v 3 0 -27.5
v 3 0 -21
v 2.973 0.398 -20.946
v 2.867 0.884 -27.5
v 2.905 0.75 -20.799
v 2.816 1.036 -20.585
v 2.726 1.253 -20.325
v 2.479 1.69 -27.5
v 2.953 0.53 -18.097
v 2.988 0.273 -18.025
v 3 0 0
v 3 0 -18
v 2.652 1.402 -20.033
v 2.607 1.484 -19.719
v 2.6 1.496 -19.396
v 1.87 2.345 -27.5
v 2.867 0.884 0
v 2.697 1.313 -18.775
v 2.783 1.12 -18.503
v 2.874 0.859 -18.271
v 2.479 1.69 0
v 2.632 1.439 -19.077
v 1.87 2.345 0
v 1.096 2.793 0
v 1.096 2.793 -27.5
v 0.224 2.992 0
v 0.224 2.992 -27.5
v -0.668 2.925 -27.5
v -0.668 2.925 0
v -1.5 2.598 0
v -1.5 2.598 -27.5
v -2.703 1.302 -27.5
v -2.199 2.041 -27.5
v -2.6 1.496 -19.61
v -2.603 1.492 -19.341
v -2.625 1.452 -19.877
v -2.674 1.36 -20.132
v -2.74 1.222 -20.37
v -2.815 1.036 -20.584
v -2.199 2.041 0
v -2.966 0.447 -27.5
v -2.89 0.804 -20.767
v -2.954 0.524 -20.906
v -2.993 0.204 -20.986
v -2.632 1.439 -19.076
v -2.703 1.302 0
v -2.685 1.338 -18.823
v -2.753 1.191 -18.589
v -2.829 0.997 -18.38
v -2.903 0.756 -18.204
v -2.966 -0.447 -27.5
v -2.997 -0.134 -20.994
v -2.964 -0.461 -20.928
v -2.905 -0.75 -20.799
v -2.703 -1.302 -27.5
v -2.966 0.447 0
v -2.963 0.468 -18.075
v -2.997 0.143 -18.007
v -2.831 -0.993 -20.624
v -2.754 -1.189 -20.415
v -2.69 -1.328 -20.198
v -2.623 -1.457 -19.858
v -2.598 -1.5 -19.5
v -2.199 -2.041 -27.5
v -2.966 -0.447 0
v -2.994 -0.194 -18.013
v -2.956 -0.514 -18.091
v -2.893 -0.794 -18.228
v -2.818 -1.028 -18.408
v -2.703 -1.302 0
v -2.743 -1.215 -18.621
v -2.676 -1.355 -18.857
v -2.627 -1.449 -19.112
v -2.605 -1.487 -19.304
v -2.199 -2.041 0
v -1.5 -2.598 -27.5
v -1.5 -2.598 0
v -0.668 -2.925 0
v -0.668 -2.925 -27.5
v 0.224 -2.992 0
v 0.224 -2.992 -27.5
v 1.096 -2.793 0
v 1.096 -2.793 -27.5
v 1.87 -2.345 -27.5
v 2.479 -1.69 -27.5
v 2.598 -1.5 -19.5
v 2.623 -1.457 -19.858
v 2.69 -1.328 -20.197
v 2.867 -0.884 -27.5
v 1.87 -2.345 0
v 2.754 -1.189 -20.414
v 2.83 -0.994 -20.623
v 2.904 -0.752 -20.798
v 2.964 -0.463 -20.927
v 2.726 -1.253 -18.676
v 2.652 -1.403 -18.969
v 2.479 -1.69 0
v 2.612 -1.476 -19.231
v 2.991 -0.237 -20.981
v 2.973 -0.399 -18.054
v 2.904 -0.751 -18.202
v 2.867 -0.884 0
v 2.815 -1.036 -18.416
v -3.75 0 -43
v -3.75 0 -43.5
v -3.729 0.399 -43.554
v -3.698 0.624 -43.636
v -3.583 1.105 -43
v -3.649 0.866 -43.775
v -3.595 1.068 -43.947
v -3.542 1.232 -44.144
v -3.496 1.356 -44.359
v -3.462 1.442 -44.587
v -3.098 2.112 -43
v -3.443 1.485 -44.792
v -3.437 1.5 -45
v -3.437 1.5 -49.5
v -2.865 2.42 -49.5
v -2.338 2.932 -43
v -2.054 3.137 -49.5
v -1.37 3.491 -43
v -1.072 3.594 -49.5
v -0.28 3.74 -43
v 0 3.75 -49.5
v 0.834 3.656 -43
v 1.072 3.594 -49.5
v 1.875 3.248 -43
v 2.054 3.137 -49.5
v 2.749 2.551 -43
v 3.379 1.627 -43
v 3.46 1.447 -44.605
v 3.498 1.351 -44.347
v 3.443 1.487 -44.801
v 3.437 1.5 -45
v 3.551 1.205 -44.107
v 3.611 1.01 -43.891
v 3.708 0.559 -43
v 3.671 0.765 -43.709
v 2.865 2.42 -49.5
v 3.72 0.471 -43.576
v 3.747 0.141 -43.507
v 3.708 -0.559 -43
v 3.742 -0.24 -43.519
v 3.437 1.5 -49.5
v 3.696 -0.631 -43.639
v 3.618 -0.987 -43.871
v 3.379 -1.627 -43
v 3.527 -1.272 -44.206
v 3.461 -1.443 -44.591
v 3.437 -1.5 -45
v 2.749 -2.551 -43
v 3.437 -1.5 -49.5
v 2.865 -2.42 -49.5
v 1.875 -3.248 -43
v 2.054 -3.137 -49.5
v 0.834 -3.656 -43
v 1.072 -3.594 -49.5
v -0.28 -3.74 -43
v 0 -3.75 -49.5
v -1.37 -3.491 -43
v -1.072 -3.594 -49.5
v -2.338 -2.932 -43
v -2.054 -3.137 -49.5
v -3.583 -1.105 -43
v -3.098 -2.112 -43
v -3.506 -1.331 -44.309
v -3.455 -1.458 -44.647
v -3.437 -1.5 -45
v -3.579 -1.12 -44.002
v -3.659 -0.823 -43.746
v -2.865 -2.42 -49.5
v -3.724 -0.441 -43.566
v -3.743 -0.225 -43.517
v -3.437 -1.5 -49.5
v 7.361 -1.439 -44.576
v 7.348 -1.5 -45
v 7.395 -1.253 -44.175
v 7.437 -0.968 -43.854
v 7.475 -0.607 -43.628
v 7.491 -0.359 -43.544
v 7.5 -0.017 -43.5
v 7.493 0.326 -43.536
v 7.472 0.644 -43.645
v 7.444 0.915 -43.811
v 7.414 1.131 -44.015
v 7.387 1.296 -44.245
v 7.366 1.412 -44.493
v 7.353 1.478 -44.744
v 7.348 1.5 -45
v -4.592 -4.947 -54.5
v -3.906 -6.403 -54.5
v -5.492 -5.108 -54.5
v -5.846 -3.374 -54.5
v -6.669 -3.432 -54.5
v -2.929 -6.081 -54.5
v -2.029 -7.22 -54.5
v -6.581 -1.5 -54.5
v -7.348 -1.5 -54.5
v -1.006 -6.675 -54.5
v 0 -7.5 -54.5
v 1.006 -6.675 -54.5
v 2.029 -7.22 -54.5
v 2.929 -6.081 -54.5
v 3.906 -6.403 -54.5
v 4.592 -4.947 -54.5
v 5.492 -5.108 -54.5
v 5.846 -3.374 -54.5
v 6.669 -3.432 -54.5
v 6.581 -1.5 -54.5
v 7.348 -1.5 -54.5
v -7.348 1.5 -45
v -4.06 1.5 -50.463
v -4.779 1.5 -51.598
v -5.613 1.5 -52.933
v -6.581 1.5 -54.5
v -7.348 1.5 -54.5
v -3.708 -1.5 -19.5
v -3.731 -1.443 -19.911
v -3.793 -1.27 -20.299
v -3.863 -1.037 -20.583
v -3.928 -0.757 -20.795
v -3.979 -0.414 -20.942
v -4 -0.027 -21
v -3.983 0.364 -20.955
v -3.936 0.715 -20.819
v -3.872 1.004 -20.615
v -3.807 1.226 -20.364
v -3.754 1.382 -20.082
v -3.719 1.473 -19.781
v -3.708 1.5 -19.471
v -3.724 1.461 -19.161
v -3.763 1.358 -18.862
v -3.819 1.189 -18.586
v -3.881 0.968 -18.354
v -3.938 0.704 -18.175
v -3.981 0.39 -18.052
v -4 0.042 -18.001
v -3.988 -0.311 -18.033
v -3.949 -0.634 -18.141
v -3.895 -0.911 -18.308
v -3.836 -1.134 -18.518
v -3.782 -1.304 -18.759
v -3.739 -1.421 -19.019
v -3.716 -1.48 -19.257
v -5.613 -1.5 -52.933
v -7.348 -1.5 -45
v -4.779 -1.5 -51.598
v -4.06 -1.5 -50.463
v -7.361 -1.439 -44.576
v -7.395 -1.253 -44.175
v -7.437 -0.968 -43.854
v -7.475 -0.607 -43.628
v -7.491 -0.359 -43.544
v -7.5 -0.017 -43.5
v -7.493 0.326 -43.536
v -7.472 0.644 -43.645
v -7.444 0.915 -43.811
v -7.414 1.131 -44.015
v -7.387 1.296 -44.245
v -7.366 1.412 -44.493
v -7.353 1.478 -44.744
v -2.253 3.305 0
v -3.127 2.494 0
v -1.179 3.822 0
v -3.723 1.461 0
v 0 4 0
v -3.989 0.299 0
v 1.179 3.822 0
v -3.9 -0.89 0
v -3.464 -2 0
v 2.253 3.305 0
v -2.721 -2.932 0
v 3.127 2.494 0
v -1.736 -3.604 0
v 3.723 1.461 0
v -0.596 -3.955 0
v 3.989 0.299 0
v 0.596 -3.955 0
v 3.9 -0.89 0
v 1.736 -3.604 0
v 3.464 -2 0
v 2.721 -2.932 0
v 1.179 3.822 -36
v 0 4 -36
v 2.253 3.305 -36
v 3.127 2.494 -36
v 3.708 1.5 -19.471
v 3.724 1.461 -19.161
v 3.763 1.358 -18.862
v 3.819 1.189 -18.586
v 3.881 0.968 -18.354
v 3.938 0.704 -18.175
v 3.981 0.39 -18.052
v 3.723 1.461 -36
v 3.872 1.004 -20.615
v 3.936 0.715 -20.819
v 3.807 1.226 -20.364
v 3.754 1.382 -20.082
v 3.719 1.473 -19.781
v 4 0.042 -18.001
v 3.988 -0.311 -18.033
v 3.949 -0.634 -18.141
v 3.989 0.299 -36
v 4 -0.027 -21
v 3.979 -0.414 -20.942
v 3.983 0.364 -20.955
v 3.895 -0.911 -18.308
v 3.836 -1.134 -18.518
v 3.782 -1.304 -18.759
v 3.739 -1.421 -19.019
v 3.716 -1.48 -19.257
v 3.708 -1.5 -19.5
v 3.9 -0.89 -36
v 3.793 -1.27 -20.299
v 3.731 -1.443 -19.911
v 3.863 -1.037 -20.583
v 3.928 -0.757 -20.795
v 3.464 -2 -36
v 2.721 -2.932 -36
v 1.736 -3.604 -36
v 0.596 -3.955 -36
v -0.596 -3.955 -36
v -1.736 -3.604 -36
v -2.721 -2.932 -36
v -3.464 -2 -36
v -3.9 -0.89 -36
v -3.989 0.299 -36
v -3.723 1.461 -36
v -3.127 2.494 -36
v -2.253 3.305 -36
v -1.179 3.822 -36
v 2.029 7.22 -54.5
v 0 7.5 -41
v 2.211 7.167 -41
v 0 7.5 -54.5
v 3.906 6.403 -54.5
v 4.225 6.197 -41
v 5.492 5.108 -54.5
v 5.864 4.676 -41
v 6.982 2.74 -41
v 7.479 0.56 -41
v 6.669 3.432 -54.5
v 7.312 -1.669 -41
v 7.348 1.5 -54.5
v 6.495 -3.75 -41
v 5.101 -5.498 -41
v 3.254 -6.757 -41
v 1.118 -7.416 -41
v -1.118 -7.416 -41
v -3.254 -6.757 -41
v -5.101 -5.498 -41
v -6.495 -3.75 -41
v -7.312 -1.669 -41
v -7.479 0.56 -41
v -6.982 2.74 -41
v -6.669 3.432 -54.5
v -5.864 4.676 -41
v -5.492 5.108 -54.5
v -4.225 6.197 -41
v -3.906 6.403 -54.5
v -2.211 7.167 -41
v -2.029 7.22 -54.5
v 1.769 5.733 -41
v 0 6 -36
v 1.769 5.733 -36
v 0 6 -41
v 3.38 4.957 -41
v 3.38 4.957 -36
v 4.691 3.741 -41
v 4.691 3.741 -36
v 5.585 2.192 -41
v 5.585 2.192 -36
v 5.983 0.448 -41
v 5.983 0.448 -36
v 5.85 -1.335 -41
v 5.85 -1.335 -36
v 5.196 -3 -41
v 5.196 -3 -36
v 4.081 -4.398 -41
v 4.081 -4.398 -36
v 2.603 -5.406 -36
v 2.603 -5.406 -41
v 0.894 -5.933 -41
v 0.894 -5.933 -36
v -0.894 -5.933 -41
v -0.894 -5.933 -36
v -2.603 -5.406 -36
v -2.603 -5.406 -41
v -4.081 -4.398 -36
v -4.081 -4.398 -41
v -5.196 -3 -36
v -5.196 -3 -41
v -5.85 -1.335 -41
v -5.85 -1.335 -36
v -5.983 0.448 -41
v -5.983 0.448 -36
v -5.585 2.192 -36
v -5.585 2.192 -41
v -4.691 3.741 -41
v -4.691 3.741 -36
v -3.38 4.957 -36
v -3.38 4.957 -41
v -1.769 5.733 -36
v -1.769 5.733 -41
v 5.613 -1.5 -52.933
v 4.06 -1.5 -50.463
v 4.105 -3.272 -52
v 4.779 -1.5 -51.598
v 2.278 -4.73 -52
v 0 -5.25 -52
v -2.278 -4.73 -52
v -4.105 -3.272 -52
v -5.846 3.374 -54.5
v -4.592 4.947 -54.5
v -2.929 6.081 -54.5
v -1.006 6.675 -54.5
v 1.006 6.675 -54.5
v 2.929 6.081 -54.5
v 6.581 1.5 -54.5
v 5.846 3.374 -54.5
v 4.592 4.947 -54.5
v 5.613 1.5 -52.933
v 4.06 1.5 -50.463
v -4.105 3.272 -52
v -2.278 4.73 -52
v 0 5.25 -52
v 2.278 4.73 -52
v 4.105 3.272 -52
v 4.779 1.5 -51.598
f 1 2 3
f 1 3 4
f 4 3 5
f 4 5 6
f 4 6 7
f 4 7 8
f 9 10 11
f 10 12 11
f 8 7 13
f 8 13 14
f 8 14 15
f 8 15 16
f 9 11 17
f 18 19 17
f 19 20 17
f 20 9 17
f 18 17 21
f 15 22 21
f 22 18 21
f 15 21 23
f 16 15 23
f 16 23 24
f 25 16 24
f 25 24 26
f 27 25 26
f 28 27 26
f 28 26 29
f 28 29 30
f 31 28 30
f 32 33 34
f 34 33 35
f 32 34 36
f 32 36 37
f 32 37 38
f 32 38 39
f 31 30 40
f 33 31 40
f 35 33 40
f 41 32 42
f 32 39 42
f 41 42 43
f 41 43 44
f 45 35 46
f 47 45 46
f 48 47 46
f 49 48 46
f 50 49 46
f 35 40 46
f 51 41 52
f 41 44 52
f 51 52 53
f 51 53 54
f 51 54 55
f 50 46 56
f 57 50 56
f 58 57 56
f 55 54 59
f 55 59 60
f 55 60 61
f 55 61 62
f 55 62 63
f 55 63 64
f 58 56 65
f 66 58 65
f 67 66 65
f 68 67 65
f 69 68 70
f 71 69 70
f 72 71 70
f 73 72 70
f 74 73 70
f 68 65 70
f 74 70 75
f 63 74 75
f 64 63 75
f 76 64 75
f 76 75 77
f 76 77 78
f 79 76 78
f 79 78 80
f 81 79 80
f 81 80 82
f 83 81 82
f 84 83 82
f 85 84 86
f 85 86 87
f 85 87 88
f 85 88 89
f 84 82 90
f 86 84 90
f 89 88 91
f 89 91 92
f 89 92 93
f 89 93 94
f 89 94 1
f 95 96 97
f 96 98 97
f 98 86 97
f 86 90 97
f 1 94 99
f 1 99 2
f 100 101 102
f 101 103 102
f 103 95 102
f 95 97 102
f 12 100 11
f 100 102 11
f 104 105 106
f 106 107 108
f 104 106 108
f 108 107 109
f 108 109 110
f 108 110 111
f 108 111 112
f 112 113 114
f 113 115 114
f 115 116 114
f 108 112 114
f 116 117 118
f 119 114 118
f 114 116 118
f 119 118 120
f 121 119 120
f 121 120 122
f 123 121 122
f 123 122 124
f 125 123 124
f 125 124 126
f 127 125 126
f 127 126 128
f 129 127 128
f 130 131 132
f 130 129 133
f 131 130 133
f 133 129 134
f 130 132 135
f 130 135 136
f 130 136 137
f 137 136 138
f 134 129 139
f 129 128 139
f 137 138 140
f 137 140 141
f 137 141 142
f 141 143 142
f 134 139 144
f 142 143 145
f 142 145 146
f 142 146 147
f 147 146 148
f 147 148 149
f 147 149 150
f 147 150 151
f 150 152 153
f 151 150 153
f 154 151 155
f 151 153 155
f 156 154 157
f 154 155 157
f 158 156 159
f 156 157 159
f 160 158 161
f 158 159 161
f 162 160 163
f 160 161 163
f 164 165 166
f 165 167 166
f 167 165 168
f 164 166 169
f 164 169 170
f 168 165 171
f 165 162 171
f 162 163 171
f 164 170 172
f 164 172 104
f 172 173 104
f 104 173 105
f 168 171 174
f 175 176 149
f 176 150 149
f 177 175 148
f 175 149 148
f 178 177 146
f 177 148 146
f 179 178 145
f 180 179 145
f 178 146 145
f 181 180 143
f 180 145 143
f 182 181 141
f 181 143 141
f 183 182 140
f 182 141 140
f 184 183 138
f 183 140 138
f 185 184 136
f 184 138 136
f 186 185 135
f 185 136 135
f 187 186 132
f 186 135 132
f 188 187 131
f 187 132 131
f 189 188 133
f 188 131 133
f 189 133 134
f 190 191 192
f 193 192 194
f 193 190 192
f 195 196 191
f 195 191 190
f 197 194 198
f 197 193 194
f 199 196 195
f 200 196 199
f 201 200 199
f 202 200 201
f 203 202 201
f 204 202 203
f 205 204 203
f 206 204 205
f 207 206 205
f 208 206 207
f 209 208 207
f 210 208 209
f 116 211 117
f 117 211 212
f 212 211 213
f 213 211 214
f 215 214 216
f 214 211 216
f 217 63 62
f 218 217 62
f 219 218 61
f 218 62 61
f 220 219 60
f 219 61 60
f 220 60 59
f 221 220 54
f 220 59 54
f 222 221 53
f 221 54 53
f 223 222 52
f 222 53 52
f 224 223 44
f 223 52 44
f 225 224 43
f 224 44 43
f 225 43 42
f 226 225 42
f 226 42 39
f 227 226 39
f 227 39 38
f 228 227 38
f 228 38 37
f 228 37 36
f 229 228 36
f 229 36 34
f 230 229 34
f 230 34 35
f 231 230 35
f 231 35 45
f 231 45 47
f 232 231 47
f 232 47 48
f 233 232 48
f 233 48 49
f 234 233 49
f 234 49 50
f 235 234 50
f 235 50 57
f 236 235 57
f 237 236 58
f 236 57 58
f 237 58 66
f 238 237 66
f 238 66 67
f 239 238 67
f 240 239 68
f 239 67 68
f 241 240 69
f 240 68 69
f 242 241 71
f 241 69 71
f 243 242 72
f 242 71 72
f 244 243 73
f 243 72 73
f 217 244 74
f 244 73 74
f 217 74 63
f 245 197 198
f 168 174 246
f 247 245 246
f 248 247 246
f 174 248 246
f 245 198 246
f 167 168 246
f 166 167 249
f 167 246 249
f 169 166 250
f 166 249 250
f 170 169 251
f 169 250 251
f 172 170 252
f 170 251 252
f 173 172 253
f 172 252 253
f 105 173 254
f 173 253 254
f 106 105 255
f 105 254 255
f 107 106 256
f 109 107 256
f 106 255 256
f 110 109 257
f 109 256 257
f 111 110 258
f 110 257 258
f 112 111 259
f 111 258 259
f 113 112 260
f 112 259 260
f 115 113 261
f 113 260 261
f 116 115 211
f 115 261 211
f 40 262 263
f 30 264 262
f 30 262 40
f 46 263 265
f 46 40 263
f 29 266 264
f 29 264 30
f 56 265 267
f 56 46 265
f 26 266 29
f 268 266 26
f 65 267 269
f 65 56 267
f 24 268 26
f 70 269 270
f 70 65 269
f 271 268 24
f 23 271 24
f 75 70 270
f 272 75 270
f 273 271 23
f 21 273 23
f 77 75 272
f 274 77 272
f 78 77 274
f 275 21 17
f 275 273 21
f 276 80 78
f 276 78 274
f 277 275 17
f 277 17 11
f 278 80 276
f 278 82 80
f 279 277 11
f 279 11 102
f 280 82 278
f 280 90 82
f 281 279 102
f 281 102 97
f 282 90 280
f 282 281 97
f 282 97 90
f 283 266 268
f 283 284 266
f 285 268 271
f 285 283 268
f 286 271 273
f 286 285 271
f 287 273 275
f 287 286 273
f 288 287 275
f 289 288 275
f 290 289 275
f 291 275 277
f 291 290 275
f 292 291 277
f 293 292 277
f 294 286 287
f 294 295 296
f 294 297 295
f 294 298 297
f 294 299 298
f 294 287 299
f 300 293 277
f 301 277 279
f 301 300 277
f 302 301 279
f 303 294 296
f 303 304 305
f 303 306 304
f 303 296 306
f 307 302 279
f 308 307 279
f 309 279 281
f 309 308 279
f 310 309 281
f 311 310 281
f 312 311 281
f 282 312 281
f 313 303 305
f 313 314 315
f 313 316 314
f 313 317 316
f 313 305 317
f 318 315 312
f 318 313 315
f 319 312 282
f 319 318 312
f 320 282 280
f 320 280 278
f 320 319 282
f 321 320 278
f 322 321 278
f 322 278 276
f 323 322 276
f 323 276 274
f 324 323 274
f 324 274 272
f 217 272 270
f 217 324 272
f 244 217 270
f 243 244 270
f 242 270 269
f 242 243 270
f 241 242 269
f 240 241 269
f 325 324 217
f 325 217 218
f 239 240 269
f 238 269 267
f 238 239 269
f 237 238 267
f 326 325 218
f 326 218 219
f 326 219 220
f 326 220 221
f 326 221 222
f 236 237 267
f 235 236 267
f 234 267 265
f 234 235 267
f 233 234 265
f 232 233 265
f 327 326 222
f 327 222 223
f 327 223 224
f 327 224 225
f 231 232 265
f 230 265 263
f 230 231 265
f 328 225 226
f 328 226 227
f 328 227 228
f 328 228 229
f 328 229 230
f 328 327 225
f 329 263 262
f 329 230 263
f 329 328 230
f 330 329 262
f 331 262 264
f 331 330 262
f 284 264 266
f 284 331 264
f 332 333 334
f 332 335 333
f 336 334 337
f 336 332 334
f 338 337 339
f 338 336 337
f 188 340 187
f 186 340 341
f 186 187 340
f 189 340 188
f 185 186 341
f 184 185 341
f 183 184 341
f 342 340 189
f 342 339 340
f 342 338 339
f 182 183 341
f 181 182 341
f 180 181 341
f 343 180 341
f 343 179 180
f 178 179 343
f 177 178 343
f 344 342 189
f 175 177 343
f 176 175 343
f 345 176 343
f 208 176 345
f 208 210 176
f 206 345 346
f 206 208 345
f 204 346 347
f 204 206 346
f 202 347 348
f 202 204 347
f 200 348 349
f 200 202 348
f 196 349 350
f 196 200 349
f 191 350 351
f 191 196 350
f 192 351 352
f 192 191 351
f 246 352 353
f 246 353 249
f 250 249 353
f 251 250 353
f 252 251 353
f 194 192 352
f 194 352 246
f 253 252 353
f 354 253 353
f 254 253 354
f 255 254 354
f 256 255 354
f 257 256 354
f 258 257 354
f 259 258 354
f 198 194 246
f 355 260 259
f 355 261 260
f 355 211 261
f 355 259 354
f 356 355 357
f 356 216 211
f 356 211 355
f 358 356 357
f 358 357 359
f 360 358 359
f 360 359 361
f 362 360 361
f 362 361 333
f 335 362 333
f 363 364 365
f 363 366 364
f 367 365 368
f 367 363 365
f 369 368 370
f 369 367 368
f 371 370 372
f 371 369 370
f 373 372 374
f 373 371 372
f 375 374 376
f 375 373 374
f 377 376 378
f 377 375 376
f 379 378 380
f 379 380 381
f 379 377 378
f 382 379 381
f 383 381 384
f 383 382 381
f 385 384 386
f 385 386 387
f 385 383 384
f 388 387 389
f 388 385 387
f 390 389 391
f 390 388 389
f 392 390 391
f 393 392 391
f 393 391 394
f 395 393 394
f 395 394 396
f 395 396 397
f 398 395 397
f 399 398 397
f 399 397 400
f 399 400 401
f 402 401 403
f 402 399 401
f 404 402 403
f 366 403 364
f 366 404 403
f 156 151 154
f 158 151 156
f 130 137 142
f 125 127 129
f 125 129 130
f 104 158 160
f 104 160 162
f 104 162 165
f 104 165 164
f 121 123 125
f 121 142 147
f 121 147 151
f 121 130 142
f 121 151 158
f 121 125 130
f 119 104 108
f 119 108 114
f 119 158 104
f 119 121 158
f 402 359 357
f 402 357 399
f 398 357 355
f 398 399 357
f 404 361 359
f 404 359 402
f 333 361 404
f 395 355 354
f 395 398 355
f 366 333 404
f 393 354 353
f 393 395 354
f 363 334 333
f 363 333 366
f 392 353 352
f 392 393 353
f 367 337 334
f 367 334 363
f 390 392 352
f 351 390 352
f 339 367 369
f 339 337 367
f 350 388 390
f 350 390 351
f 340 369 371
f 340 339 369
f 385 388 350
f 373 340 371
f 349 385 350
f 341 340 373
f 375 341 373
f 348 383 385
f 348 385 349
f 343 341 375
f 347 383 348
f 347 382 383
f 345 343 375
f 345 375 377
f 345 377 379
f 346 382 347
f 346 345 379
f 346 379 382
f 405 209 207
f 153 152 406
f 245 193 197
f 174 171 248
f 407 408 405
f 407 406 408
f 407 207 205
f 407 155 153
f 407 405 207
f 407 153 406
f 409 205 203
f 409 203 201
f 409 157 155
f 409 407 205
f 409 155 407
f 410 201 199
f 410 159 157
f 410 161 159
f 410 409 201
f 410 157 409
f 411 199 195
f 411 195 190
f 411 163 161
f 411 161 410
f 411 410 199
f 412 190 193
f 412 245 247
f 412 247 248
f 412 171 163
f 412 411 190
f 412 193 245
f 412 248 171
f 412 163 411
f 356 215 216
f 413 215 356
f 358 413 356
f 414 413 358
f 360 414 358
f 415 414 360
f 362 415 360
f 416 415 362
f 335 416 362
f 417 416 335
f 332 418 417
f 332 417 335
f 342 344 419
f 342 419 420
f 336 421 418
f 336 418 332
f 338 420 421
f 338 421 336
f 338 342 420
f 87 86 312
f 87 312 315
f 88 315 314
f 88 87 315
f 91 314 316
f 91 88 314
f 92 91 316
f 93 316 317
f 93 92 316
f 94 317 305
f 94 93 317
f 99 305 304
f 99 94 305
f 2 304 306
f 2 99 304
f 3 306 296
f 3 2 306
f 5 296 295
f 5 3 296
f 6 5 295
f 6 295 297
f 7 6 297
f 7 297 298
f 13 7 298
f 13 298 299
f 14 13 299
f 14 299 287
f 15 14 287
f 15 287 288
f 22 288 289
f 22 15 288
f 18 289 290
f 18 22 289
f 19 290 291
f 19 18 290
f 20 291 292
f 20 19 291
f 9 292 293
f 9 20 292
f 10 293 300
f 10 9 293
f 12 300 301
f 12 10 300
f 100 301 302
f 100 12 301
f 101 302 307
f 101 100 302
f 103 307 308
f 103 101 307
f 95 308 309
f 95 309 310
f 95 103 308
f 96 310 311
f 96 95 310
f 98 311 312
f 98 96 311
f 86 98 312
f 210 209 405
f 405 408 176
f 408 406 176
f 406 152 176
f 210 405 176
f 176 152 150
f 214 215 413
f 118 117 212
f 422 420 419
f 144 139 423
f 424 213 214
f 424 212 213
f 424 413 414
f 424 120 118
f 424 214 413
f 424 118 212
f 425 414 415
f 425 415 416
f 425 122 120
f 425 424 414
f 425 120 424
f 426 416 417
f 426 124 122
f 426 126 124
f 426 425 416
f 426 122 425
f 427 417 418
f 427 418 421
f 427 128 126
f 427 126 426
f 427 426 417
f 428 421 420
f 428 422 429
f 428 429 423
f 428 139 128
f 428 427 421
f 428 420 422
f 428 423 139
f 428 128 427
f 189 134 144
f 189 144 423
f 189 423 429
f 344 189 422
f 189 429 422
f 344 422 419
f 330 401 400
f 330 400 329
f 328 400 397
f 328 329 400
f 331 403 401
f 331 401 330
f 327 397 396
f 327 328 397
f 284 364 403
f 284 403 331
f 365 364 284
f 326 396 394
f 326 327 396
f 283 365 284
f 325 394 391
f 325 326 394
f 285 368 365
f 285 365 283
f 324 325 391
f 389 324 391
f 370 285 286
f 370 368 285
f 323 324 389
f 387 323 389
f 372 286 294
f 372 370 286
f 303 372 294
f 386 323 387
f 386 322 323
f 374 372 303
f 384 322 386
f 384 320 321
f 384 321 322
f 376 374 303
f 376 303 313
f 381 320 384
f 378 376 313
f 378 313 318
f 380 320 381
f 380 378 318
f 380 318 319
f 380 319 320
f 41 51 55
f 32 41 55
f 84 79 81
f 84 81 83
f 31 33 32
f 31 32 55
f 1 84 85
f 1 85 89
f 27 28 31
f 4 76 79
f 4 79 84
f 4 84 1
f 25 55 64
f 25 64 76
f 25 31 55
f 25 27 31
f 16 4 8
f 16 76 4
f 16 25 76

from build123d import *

# Parameters (mm, degrees)
CUT_EXTRUDE1_DEPTH      = 8.5
CUT_EXTRUDE1_DEPTH_BACK = 8.5
SKETCH3_R               = 3.75
CUT_EXTRUDE2_DEPTH      = 11.5
CHAMFER1_SIZE           = 3
CHAMFER1_SIZE2          = 5
CHAMFER1_PART_2_SIZE    = 3
CHAMFER1_PART_2_SIZE2   = 5
SKETCH4_R               = 3
CUT_EXTRUDE3_DEPTH      = 27.5
SKETCH5_R               = 1.5
CUT_EXTRUDE4_DEPTH      = 8.5000001
CUT_EXTRUDE4_DEPTH_BACK = 8.5000001


with BuildPart() as part:
    # Sketch1 → Revolve1 (revolve)
    with BuildSketch(Plane(origin=(0, 0, 0), x_dir=(0, 0, -1), z_dir=(1, 0, 0))):
        Polygon((0, 4), (36, 4), (36, 6), (41, 6), (41, 7.5), (54.5, 7.5), (54.5, 0), (0, 0), align=None)
    revolve(axis=Axis((0, 0, 0), (0, 0, -1)))

    # Sketch2 → Cut-Extrude1 (cut, two sides)
    with BuildSketch(Plane(origin=(0, 0, 0), x_dir=(0, 0, -1), z_dir=(1, 0, 0))) as cut_extrude1_sk:
        with BuildLine():
            Line((54.5, -1.5), (45, -1.5))
            ThreePointArc((45, -1.5), (43.5, 0), (45, 1.5))
            Line((45, 1.5), (54.5, 1.5))
            ThreePointArc((54.5, 1.5), (56, 0), (54.5, -1.5))
        make_face()
    extrude(amount=CUT_EXTRUDE1_DEPTH, mode=Mode.SUBTRACT)
    extrude(cut_extrude1_sk.sketch, amount=-CUT_EXTRUDE1_DEPTH_BACK, mode=Mode.SUBTRACT)

    # Sketch3 → Cut-Extrude2 (cut)
    with BuildSketch(Plane(origin=(0, 0, -54.5), x_dir=(-1, 0, 0), z_dir=(0, 0, -1))):
        Circle(SKETCH3_R)
    extrude(amount=-CUT_EXTRUDE2_DEPTH, mode=Mode.SUBTRACT)

    # Chamfer1
    chamfer1_edges = [part.edges().sort_by_distance(p)[0] for p in [
        (0, -3.75, -54.5),
    ]]
    chamfer1_side = [part.faces().sort_by_distance(p)[0] for p in [
        (0, -4.328722243, -54.5),
    ]]
    chamfer(chamfer1_edges, length=CHAMFER1_SIZE, length2=CHAMFER1_SIZE2, reference=chamfer1_side[0])

    # Chamfer1 part 2
    chamfer1_part_2_edges = [part.edges().sort_by_distance(p)[0] for p in [
        (0, 3.75, -54.5),
    ]]
    chamfer1_part_2_side = [part.faces().sort_by_distance(p)[0] for p in [
        (0, 4.328722243, -54.5),
    ]]
    chamfer(chamfer1_part_2_edges, length=CHAMFER1_PART_2_SIZE, length2=CHAMFER1_PART_2_SIZE2, reference=chamfer1_part_2_side[0])

    # Sketch4 → Cut-Extrude3 (cut)
    with BuildSketch(Plane.XY):
        Circle(SKETCH4_R)
    extrude(amount=-CUT_EXTRUDE3_DEPTH, mode=Mode.SUBTRACT)

    # Sketch5 → Cut-Extrude4 (cut, two sides)
    with BuildSketch(Plane(origin=(0, 0, 0), x_dir=(0, -1, 0), z_dir=(1, 0, 0))) as cut_extrude4_sk:
        with Locations((0, 19.5)):
            Circle(SKETCH5_R)
    extrude(amount=CUT_EXTRUDE4_DEPTH, mode=Mode.SUBTRACT)
    extrude(cut_extrude4_sk.sketch, amount=-CUT_EXTRUDE4_DEPTH_BACK, mode=Mode.SUBTRACT)


solid = part.part
